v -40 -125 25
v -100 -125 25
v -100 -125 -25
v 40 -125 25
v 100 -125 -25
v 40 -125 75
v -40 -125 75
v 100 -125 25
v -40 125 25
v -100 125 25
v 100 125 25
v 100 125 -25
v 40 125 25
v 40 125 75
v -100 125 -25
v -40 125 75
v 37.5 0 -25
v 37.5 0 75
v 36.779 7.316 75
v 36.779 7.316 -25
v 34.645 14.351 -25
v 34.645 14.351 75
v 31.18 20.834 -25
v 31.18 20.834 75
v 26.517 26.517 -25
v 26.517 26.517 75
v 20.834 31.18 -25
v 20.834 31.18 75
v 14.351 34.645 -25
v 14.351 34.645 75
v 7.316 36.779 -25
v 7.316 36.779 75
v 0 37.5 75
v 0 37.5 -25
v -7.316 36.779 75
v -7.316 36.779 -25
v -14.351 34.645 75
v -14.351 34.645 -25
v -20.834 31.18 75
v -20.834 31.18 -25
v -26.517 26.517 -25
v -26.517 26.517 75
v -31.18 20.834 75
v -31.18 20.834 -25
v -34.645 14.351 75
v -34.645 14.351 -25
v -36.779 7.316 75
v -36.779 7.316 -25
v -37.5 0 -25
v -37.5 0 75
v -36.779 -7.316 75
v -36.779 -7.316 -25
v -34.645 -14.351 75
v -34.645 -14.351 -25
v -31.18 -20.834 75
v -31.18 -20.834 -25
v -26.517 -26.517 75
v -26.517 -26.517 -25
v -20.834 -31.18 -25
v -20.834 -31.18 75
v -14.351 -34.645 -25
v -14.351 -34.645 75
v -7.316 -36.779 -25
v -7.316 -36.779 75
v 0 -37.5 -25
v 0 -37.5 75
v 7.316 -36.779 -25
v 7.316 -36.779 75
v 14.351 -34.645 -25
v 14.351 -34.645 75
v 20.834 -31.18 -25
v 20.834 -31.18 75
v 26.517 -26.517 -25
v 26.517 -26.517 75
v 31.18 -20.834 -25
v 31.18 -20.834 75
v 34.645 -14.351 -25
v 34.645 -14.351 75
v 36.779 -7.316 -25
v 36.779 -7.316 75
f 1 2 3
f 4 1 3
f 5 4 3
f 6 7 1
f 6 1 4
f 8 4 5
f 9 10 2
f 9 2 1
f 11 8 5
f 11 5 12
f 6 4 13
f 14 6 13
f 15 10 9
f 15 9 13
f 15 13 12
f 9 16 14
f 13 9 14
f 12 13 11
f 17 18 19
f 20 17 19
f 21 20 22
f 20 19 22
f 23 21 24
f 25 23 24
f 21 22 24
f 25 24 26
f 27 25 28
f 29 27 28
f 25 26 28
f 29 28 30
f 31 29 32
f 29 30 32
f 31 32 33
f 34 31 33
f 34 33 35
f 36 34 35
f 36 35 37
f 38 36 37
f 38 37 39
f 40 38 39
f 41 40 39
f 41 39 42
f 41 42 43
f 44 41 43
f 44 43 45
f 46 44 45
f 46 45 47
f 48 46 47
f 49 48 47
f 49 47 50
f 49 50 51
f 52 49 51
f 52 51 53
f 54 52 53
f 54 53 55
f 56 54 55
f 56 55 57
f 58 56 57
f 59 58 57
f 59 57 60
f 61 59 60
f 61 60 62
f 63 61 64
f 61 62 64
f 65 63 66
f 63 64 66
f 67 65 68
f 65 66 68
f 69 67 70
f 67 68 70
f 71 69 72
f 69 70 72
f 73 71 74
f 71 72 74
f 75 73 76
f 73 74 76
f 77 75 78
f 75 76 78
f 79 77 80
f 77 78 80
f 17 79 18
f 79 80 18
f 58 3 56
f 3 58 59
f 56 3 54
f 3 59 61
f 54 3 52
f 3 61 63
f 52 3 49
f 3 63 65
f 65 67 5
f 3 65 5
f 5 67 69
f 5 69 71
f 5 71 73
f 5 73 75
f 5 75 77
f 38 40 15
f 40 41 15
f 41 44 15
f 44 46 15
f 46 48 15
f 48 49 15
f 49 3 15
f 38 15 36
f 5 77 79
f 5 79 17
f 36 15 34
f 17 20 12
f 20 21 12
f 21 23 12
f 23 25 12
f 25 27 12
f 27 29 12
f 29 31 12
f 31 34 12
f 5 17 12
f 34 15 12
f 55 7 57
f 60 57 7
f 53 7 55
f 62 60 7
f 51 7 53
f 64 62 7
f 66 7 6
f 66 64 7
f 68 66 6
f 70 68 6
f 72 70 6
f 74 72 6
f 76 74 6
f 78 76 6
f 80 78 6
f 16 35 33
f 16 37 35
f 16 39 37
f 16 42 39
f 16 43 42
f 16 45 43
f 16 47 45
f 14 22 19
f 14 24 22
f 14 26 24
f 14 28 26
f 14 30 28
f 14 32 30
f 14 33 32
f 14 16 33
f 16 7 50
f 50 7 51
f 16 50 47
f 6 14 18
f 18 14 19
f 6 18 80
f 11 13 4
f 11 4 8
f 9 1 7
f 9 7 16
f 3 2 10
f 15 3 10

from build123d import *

# Parameters (mm, degrees)
F0_W     = 200
F0_H     = 250
F1_DEPTH = 25
F2_W     = 80
F2_H     = 250
F3_DEPTH = 50
F4_R     = 37.5
F5_DEPTH = 137


with BuildPart() as f1:
    # F0 (on Top) → F1 (new body, symmetric)
    with BuildSketch(Plane.XY):
        Rectangle(F0_W, F0_H)
    extrude(amount=F1_DEPTH, both=True)

    # F2 (on face) → F3 (join)
    with BuildSketch(Plane.XY.offset(25)):
        Rectangle(F2_W, F2_H)
    extrude(amount=F3_DEPTH)

    # F4 (on face) → F5 (cut)
    with BuildSketch(Plane.XY.offset(75)):
        Circle(F4_R)
    extrude(amount=-F5_DEPTH, mode=Mode.SUBTRACT)


solid = f1.part
